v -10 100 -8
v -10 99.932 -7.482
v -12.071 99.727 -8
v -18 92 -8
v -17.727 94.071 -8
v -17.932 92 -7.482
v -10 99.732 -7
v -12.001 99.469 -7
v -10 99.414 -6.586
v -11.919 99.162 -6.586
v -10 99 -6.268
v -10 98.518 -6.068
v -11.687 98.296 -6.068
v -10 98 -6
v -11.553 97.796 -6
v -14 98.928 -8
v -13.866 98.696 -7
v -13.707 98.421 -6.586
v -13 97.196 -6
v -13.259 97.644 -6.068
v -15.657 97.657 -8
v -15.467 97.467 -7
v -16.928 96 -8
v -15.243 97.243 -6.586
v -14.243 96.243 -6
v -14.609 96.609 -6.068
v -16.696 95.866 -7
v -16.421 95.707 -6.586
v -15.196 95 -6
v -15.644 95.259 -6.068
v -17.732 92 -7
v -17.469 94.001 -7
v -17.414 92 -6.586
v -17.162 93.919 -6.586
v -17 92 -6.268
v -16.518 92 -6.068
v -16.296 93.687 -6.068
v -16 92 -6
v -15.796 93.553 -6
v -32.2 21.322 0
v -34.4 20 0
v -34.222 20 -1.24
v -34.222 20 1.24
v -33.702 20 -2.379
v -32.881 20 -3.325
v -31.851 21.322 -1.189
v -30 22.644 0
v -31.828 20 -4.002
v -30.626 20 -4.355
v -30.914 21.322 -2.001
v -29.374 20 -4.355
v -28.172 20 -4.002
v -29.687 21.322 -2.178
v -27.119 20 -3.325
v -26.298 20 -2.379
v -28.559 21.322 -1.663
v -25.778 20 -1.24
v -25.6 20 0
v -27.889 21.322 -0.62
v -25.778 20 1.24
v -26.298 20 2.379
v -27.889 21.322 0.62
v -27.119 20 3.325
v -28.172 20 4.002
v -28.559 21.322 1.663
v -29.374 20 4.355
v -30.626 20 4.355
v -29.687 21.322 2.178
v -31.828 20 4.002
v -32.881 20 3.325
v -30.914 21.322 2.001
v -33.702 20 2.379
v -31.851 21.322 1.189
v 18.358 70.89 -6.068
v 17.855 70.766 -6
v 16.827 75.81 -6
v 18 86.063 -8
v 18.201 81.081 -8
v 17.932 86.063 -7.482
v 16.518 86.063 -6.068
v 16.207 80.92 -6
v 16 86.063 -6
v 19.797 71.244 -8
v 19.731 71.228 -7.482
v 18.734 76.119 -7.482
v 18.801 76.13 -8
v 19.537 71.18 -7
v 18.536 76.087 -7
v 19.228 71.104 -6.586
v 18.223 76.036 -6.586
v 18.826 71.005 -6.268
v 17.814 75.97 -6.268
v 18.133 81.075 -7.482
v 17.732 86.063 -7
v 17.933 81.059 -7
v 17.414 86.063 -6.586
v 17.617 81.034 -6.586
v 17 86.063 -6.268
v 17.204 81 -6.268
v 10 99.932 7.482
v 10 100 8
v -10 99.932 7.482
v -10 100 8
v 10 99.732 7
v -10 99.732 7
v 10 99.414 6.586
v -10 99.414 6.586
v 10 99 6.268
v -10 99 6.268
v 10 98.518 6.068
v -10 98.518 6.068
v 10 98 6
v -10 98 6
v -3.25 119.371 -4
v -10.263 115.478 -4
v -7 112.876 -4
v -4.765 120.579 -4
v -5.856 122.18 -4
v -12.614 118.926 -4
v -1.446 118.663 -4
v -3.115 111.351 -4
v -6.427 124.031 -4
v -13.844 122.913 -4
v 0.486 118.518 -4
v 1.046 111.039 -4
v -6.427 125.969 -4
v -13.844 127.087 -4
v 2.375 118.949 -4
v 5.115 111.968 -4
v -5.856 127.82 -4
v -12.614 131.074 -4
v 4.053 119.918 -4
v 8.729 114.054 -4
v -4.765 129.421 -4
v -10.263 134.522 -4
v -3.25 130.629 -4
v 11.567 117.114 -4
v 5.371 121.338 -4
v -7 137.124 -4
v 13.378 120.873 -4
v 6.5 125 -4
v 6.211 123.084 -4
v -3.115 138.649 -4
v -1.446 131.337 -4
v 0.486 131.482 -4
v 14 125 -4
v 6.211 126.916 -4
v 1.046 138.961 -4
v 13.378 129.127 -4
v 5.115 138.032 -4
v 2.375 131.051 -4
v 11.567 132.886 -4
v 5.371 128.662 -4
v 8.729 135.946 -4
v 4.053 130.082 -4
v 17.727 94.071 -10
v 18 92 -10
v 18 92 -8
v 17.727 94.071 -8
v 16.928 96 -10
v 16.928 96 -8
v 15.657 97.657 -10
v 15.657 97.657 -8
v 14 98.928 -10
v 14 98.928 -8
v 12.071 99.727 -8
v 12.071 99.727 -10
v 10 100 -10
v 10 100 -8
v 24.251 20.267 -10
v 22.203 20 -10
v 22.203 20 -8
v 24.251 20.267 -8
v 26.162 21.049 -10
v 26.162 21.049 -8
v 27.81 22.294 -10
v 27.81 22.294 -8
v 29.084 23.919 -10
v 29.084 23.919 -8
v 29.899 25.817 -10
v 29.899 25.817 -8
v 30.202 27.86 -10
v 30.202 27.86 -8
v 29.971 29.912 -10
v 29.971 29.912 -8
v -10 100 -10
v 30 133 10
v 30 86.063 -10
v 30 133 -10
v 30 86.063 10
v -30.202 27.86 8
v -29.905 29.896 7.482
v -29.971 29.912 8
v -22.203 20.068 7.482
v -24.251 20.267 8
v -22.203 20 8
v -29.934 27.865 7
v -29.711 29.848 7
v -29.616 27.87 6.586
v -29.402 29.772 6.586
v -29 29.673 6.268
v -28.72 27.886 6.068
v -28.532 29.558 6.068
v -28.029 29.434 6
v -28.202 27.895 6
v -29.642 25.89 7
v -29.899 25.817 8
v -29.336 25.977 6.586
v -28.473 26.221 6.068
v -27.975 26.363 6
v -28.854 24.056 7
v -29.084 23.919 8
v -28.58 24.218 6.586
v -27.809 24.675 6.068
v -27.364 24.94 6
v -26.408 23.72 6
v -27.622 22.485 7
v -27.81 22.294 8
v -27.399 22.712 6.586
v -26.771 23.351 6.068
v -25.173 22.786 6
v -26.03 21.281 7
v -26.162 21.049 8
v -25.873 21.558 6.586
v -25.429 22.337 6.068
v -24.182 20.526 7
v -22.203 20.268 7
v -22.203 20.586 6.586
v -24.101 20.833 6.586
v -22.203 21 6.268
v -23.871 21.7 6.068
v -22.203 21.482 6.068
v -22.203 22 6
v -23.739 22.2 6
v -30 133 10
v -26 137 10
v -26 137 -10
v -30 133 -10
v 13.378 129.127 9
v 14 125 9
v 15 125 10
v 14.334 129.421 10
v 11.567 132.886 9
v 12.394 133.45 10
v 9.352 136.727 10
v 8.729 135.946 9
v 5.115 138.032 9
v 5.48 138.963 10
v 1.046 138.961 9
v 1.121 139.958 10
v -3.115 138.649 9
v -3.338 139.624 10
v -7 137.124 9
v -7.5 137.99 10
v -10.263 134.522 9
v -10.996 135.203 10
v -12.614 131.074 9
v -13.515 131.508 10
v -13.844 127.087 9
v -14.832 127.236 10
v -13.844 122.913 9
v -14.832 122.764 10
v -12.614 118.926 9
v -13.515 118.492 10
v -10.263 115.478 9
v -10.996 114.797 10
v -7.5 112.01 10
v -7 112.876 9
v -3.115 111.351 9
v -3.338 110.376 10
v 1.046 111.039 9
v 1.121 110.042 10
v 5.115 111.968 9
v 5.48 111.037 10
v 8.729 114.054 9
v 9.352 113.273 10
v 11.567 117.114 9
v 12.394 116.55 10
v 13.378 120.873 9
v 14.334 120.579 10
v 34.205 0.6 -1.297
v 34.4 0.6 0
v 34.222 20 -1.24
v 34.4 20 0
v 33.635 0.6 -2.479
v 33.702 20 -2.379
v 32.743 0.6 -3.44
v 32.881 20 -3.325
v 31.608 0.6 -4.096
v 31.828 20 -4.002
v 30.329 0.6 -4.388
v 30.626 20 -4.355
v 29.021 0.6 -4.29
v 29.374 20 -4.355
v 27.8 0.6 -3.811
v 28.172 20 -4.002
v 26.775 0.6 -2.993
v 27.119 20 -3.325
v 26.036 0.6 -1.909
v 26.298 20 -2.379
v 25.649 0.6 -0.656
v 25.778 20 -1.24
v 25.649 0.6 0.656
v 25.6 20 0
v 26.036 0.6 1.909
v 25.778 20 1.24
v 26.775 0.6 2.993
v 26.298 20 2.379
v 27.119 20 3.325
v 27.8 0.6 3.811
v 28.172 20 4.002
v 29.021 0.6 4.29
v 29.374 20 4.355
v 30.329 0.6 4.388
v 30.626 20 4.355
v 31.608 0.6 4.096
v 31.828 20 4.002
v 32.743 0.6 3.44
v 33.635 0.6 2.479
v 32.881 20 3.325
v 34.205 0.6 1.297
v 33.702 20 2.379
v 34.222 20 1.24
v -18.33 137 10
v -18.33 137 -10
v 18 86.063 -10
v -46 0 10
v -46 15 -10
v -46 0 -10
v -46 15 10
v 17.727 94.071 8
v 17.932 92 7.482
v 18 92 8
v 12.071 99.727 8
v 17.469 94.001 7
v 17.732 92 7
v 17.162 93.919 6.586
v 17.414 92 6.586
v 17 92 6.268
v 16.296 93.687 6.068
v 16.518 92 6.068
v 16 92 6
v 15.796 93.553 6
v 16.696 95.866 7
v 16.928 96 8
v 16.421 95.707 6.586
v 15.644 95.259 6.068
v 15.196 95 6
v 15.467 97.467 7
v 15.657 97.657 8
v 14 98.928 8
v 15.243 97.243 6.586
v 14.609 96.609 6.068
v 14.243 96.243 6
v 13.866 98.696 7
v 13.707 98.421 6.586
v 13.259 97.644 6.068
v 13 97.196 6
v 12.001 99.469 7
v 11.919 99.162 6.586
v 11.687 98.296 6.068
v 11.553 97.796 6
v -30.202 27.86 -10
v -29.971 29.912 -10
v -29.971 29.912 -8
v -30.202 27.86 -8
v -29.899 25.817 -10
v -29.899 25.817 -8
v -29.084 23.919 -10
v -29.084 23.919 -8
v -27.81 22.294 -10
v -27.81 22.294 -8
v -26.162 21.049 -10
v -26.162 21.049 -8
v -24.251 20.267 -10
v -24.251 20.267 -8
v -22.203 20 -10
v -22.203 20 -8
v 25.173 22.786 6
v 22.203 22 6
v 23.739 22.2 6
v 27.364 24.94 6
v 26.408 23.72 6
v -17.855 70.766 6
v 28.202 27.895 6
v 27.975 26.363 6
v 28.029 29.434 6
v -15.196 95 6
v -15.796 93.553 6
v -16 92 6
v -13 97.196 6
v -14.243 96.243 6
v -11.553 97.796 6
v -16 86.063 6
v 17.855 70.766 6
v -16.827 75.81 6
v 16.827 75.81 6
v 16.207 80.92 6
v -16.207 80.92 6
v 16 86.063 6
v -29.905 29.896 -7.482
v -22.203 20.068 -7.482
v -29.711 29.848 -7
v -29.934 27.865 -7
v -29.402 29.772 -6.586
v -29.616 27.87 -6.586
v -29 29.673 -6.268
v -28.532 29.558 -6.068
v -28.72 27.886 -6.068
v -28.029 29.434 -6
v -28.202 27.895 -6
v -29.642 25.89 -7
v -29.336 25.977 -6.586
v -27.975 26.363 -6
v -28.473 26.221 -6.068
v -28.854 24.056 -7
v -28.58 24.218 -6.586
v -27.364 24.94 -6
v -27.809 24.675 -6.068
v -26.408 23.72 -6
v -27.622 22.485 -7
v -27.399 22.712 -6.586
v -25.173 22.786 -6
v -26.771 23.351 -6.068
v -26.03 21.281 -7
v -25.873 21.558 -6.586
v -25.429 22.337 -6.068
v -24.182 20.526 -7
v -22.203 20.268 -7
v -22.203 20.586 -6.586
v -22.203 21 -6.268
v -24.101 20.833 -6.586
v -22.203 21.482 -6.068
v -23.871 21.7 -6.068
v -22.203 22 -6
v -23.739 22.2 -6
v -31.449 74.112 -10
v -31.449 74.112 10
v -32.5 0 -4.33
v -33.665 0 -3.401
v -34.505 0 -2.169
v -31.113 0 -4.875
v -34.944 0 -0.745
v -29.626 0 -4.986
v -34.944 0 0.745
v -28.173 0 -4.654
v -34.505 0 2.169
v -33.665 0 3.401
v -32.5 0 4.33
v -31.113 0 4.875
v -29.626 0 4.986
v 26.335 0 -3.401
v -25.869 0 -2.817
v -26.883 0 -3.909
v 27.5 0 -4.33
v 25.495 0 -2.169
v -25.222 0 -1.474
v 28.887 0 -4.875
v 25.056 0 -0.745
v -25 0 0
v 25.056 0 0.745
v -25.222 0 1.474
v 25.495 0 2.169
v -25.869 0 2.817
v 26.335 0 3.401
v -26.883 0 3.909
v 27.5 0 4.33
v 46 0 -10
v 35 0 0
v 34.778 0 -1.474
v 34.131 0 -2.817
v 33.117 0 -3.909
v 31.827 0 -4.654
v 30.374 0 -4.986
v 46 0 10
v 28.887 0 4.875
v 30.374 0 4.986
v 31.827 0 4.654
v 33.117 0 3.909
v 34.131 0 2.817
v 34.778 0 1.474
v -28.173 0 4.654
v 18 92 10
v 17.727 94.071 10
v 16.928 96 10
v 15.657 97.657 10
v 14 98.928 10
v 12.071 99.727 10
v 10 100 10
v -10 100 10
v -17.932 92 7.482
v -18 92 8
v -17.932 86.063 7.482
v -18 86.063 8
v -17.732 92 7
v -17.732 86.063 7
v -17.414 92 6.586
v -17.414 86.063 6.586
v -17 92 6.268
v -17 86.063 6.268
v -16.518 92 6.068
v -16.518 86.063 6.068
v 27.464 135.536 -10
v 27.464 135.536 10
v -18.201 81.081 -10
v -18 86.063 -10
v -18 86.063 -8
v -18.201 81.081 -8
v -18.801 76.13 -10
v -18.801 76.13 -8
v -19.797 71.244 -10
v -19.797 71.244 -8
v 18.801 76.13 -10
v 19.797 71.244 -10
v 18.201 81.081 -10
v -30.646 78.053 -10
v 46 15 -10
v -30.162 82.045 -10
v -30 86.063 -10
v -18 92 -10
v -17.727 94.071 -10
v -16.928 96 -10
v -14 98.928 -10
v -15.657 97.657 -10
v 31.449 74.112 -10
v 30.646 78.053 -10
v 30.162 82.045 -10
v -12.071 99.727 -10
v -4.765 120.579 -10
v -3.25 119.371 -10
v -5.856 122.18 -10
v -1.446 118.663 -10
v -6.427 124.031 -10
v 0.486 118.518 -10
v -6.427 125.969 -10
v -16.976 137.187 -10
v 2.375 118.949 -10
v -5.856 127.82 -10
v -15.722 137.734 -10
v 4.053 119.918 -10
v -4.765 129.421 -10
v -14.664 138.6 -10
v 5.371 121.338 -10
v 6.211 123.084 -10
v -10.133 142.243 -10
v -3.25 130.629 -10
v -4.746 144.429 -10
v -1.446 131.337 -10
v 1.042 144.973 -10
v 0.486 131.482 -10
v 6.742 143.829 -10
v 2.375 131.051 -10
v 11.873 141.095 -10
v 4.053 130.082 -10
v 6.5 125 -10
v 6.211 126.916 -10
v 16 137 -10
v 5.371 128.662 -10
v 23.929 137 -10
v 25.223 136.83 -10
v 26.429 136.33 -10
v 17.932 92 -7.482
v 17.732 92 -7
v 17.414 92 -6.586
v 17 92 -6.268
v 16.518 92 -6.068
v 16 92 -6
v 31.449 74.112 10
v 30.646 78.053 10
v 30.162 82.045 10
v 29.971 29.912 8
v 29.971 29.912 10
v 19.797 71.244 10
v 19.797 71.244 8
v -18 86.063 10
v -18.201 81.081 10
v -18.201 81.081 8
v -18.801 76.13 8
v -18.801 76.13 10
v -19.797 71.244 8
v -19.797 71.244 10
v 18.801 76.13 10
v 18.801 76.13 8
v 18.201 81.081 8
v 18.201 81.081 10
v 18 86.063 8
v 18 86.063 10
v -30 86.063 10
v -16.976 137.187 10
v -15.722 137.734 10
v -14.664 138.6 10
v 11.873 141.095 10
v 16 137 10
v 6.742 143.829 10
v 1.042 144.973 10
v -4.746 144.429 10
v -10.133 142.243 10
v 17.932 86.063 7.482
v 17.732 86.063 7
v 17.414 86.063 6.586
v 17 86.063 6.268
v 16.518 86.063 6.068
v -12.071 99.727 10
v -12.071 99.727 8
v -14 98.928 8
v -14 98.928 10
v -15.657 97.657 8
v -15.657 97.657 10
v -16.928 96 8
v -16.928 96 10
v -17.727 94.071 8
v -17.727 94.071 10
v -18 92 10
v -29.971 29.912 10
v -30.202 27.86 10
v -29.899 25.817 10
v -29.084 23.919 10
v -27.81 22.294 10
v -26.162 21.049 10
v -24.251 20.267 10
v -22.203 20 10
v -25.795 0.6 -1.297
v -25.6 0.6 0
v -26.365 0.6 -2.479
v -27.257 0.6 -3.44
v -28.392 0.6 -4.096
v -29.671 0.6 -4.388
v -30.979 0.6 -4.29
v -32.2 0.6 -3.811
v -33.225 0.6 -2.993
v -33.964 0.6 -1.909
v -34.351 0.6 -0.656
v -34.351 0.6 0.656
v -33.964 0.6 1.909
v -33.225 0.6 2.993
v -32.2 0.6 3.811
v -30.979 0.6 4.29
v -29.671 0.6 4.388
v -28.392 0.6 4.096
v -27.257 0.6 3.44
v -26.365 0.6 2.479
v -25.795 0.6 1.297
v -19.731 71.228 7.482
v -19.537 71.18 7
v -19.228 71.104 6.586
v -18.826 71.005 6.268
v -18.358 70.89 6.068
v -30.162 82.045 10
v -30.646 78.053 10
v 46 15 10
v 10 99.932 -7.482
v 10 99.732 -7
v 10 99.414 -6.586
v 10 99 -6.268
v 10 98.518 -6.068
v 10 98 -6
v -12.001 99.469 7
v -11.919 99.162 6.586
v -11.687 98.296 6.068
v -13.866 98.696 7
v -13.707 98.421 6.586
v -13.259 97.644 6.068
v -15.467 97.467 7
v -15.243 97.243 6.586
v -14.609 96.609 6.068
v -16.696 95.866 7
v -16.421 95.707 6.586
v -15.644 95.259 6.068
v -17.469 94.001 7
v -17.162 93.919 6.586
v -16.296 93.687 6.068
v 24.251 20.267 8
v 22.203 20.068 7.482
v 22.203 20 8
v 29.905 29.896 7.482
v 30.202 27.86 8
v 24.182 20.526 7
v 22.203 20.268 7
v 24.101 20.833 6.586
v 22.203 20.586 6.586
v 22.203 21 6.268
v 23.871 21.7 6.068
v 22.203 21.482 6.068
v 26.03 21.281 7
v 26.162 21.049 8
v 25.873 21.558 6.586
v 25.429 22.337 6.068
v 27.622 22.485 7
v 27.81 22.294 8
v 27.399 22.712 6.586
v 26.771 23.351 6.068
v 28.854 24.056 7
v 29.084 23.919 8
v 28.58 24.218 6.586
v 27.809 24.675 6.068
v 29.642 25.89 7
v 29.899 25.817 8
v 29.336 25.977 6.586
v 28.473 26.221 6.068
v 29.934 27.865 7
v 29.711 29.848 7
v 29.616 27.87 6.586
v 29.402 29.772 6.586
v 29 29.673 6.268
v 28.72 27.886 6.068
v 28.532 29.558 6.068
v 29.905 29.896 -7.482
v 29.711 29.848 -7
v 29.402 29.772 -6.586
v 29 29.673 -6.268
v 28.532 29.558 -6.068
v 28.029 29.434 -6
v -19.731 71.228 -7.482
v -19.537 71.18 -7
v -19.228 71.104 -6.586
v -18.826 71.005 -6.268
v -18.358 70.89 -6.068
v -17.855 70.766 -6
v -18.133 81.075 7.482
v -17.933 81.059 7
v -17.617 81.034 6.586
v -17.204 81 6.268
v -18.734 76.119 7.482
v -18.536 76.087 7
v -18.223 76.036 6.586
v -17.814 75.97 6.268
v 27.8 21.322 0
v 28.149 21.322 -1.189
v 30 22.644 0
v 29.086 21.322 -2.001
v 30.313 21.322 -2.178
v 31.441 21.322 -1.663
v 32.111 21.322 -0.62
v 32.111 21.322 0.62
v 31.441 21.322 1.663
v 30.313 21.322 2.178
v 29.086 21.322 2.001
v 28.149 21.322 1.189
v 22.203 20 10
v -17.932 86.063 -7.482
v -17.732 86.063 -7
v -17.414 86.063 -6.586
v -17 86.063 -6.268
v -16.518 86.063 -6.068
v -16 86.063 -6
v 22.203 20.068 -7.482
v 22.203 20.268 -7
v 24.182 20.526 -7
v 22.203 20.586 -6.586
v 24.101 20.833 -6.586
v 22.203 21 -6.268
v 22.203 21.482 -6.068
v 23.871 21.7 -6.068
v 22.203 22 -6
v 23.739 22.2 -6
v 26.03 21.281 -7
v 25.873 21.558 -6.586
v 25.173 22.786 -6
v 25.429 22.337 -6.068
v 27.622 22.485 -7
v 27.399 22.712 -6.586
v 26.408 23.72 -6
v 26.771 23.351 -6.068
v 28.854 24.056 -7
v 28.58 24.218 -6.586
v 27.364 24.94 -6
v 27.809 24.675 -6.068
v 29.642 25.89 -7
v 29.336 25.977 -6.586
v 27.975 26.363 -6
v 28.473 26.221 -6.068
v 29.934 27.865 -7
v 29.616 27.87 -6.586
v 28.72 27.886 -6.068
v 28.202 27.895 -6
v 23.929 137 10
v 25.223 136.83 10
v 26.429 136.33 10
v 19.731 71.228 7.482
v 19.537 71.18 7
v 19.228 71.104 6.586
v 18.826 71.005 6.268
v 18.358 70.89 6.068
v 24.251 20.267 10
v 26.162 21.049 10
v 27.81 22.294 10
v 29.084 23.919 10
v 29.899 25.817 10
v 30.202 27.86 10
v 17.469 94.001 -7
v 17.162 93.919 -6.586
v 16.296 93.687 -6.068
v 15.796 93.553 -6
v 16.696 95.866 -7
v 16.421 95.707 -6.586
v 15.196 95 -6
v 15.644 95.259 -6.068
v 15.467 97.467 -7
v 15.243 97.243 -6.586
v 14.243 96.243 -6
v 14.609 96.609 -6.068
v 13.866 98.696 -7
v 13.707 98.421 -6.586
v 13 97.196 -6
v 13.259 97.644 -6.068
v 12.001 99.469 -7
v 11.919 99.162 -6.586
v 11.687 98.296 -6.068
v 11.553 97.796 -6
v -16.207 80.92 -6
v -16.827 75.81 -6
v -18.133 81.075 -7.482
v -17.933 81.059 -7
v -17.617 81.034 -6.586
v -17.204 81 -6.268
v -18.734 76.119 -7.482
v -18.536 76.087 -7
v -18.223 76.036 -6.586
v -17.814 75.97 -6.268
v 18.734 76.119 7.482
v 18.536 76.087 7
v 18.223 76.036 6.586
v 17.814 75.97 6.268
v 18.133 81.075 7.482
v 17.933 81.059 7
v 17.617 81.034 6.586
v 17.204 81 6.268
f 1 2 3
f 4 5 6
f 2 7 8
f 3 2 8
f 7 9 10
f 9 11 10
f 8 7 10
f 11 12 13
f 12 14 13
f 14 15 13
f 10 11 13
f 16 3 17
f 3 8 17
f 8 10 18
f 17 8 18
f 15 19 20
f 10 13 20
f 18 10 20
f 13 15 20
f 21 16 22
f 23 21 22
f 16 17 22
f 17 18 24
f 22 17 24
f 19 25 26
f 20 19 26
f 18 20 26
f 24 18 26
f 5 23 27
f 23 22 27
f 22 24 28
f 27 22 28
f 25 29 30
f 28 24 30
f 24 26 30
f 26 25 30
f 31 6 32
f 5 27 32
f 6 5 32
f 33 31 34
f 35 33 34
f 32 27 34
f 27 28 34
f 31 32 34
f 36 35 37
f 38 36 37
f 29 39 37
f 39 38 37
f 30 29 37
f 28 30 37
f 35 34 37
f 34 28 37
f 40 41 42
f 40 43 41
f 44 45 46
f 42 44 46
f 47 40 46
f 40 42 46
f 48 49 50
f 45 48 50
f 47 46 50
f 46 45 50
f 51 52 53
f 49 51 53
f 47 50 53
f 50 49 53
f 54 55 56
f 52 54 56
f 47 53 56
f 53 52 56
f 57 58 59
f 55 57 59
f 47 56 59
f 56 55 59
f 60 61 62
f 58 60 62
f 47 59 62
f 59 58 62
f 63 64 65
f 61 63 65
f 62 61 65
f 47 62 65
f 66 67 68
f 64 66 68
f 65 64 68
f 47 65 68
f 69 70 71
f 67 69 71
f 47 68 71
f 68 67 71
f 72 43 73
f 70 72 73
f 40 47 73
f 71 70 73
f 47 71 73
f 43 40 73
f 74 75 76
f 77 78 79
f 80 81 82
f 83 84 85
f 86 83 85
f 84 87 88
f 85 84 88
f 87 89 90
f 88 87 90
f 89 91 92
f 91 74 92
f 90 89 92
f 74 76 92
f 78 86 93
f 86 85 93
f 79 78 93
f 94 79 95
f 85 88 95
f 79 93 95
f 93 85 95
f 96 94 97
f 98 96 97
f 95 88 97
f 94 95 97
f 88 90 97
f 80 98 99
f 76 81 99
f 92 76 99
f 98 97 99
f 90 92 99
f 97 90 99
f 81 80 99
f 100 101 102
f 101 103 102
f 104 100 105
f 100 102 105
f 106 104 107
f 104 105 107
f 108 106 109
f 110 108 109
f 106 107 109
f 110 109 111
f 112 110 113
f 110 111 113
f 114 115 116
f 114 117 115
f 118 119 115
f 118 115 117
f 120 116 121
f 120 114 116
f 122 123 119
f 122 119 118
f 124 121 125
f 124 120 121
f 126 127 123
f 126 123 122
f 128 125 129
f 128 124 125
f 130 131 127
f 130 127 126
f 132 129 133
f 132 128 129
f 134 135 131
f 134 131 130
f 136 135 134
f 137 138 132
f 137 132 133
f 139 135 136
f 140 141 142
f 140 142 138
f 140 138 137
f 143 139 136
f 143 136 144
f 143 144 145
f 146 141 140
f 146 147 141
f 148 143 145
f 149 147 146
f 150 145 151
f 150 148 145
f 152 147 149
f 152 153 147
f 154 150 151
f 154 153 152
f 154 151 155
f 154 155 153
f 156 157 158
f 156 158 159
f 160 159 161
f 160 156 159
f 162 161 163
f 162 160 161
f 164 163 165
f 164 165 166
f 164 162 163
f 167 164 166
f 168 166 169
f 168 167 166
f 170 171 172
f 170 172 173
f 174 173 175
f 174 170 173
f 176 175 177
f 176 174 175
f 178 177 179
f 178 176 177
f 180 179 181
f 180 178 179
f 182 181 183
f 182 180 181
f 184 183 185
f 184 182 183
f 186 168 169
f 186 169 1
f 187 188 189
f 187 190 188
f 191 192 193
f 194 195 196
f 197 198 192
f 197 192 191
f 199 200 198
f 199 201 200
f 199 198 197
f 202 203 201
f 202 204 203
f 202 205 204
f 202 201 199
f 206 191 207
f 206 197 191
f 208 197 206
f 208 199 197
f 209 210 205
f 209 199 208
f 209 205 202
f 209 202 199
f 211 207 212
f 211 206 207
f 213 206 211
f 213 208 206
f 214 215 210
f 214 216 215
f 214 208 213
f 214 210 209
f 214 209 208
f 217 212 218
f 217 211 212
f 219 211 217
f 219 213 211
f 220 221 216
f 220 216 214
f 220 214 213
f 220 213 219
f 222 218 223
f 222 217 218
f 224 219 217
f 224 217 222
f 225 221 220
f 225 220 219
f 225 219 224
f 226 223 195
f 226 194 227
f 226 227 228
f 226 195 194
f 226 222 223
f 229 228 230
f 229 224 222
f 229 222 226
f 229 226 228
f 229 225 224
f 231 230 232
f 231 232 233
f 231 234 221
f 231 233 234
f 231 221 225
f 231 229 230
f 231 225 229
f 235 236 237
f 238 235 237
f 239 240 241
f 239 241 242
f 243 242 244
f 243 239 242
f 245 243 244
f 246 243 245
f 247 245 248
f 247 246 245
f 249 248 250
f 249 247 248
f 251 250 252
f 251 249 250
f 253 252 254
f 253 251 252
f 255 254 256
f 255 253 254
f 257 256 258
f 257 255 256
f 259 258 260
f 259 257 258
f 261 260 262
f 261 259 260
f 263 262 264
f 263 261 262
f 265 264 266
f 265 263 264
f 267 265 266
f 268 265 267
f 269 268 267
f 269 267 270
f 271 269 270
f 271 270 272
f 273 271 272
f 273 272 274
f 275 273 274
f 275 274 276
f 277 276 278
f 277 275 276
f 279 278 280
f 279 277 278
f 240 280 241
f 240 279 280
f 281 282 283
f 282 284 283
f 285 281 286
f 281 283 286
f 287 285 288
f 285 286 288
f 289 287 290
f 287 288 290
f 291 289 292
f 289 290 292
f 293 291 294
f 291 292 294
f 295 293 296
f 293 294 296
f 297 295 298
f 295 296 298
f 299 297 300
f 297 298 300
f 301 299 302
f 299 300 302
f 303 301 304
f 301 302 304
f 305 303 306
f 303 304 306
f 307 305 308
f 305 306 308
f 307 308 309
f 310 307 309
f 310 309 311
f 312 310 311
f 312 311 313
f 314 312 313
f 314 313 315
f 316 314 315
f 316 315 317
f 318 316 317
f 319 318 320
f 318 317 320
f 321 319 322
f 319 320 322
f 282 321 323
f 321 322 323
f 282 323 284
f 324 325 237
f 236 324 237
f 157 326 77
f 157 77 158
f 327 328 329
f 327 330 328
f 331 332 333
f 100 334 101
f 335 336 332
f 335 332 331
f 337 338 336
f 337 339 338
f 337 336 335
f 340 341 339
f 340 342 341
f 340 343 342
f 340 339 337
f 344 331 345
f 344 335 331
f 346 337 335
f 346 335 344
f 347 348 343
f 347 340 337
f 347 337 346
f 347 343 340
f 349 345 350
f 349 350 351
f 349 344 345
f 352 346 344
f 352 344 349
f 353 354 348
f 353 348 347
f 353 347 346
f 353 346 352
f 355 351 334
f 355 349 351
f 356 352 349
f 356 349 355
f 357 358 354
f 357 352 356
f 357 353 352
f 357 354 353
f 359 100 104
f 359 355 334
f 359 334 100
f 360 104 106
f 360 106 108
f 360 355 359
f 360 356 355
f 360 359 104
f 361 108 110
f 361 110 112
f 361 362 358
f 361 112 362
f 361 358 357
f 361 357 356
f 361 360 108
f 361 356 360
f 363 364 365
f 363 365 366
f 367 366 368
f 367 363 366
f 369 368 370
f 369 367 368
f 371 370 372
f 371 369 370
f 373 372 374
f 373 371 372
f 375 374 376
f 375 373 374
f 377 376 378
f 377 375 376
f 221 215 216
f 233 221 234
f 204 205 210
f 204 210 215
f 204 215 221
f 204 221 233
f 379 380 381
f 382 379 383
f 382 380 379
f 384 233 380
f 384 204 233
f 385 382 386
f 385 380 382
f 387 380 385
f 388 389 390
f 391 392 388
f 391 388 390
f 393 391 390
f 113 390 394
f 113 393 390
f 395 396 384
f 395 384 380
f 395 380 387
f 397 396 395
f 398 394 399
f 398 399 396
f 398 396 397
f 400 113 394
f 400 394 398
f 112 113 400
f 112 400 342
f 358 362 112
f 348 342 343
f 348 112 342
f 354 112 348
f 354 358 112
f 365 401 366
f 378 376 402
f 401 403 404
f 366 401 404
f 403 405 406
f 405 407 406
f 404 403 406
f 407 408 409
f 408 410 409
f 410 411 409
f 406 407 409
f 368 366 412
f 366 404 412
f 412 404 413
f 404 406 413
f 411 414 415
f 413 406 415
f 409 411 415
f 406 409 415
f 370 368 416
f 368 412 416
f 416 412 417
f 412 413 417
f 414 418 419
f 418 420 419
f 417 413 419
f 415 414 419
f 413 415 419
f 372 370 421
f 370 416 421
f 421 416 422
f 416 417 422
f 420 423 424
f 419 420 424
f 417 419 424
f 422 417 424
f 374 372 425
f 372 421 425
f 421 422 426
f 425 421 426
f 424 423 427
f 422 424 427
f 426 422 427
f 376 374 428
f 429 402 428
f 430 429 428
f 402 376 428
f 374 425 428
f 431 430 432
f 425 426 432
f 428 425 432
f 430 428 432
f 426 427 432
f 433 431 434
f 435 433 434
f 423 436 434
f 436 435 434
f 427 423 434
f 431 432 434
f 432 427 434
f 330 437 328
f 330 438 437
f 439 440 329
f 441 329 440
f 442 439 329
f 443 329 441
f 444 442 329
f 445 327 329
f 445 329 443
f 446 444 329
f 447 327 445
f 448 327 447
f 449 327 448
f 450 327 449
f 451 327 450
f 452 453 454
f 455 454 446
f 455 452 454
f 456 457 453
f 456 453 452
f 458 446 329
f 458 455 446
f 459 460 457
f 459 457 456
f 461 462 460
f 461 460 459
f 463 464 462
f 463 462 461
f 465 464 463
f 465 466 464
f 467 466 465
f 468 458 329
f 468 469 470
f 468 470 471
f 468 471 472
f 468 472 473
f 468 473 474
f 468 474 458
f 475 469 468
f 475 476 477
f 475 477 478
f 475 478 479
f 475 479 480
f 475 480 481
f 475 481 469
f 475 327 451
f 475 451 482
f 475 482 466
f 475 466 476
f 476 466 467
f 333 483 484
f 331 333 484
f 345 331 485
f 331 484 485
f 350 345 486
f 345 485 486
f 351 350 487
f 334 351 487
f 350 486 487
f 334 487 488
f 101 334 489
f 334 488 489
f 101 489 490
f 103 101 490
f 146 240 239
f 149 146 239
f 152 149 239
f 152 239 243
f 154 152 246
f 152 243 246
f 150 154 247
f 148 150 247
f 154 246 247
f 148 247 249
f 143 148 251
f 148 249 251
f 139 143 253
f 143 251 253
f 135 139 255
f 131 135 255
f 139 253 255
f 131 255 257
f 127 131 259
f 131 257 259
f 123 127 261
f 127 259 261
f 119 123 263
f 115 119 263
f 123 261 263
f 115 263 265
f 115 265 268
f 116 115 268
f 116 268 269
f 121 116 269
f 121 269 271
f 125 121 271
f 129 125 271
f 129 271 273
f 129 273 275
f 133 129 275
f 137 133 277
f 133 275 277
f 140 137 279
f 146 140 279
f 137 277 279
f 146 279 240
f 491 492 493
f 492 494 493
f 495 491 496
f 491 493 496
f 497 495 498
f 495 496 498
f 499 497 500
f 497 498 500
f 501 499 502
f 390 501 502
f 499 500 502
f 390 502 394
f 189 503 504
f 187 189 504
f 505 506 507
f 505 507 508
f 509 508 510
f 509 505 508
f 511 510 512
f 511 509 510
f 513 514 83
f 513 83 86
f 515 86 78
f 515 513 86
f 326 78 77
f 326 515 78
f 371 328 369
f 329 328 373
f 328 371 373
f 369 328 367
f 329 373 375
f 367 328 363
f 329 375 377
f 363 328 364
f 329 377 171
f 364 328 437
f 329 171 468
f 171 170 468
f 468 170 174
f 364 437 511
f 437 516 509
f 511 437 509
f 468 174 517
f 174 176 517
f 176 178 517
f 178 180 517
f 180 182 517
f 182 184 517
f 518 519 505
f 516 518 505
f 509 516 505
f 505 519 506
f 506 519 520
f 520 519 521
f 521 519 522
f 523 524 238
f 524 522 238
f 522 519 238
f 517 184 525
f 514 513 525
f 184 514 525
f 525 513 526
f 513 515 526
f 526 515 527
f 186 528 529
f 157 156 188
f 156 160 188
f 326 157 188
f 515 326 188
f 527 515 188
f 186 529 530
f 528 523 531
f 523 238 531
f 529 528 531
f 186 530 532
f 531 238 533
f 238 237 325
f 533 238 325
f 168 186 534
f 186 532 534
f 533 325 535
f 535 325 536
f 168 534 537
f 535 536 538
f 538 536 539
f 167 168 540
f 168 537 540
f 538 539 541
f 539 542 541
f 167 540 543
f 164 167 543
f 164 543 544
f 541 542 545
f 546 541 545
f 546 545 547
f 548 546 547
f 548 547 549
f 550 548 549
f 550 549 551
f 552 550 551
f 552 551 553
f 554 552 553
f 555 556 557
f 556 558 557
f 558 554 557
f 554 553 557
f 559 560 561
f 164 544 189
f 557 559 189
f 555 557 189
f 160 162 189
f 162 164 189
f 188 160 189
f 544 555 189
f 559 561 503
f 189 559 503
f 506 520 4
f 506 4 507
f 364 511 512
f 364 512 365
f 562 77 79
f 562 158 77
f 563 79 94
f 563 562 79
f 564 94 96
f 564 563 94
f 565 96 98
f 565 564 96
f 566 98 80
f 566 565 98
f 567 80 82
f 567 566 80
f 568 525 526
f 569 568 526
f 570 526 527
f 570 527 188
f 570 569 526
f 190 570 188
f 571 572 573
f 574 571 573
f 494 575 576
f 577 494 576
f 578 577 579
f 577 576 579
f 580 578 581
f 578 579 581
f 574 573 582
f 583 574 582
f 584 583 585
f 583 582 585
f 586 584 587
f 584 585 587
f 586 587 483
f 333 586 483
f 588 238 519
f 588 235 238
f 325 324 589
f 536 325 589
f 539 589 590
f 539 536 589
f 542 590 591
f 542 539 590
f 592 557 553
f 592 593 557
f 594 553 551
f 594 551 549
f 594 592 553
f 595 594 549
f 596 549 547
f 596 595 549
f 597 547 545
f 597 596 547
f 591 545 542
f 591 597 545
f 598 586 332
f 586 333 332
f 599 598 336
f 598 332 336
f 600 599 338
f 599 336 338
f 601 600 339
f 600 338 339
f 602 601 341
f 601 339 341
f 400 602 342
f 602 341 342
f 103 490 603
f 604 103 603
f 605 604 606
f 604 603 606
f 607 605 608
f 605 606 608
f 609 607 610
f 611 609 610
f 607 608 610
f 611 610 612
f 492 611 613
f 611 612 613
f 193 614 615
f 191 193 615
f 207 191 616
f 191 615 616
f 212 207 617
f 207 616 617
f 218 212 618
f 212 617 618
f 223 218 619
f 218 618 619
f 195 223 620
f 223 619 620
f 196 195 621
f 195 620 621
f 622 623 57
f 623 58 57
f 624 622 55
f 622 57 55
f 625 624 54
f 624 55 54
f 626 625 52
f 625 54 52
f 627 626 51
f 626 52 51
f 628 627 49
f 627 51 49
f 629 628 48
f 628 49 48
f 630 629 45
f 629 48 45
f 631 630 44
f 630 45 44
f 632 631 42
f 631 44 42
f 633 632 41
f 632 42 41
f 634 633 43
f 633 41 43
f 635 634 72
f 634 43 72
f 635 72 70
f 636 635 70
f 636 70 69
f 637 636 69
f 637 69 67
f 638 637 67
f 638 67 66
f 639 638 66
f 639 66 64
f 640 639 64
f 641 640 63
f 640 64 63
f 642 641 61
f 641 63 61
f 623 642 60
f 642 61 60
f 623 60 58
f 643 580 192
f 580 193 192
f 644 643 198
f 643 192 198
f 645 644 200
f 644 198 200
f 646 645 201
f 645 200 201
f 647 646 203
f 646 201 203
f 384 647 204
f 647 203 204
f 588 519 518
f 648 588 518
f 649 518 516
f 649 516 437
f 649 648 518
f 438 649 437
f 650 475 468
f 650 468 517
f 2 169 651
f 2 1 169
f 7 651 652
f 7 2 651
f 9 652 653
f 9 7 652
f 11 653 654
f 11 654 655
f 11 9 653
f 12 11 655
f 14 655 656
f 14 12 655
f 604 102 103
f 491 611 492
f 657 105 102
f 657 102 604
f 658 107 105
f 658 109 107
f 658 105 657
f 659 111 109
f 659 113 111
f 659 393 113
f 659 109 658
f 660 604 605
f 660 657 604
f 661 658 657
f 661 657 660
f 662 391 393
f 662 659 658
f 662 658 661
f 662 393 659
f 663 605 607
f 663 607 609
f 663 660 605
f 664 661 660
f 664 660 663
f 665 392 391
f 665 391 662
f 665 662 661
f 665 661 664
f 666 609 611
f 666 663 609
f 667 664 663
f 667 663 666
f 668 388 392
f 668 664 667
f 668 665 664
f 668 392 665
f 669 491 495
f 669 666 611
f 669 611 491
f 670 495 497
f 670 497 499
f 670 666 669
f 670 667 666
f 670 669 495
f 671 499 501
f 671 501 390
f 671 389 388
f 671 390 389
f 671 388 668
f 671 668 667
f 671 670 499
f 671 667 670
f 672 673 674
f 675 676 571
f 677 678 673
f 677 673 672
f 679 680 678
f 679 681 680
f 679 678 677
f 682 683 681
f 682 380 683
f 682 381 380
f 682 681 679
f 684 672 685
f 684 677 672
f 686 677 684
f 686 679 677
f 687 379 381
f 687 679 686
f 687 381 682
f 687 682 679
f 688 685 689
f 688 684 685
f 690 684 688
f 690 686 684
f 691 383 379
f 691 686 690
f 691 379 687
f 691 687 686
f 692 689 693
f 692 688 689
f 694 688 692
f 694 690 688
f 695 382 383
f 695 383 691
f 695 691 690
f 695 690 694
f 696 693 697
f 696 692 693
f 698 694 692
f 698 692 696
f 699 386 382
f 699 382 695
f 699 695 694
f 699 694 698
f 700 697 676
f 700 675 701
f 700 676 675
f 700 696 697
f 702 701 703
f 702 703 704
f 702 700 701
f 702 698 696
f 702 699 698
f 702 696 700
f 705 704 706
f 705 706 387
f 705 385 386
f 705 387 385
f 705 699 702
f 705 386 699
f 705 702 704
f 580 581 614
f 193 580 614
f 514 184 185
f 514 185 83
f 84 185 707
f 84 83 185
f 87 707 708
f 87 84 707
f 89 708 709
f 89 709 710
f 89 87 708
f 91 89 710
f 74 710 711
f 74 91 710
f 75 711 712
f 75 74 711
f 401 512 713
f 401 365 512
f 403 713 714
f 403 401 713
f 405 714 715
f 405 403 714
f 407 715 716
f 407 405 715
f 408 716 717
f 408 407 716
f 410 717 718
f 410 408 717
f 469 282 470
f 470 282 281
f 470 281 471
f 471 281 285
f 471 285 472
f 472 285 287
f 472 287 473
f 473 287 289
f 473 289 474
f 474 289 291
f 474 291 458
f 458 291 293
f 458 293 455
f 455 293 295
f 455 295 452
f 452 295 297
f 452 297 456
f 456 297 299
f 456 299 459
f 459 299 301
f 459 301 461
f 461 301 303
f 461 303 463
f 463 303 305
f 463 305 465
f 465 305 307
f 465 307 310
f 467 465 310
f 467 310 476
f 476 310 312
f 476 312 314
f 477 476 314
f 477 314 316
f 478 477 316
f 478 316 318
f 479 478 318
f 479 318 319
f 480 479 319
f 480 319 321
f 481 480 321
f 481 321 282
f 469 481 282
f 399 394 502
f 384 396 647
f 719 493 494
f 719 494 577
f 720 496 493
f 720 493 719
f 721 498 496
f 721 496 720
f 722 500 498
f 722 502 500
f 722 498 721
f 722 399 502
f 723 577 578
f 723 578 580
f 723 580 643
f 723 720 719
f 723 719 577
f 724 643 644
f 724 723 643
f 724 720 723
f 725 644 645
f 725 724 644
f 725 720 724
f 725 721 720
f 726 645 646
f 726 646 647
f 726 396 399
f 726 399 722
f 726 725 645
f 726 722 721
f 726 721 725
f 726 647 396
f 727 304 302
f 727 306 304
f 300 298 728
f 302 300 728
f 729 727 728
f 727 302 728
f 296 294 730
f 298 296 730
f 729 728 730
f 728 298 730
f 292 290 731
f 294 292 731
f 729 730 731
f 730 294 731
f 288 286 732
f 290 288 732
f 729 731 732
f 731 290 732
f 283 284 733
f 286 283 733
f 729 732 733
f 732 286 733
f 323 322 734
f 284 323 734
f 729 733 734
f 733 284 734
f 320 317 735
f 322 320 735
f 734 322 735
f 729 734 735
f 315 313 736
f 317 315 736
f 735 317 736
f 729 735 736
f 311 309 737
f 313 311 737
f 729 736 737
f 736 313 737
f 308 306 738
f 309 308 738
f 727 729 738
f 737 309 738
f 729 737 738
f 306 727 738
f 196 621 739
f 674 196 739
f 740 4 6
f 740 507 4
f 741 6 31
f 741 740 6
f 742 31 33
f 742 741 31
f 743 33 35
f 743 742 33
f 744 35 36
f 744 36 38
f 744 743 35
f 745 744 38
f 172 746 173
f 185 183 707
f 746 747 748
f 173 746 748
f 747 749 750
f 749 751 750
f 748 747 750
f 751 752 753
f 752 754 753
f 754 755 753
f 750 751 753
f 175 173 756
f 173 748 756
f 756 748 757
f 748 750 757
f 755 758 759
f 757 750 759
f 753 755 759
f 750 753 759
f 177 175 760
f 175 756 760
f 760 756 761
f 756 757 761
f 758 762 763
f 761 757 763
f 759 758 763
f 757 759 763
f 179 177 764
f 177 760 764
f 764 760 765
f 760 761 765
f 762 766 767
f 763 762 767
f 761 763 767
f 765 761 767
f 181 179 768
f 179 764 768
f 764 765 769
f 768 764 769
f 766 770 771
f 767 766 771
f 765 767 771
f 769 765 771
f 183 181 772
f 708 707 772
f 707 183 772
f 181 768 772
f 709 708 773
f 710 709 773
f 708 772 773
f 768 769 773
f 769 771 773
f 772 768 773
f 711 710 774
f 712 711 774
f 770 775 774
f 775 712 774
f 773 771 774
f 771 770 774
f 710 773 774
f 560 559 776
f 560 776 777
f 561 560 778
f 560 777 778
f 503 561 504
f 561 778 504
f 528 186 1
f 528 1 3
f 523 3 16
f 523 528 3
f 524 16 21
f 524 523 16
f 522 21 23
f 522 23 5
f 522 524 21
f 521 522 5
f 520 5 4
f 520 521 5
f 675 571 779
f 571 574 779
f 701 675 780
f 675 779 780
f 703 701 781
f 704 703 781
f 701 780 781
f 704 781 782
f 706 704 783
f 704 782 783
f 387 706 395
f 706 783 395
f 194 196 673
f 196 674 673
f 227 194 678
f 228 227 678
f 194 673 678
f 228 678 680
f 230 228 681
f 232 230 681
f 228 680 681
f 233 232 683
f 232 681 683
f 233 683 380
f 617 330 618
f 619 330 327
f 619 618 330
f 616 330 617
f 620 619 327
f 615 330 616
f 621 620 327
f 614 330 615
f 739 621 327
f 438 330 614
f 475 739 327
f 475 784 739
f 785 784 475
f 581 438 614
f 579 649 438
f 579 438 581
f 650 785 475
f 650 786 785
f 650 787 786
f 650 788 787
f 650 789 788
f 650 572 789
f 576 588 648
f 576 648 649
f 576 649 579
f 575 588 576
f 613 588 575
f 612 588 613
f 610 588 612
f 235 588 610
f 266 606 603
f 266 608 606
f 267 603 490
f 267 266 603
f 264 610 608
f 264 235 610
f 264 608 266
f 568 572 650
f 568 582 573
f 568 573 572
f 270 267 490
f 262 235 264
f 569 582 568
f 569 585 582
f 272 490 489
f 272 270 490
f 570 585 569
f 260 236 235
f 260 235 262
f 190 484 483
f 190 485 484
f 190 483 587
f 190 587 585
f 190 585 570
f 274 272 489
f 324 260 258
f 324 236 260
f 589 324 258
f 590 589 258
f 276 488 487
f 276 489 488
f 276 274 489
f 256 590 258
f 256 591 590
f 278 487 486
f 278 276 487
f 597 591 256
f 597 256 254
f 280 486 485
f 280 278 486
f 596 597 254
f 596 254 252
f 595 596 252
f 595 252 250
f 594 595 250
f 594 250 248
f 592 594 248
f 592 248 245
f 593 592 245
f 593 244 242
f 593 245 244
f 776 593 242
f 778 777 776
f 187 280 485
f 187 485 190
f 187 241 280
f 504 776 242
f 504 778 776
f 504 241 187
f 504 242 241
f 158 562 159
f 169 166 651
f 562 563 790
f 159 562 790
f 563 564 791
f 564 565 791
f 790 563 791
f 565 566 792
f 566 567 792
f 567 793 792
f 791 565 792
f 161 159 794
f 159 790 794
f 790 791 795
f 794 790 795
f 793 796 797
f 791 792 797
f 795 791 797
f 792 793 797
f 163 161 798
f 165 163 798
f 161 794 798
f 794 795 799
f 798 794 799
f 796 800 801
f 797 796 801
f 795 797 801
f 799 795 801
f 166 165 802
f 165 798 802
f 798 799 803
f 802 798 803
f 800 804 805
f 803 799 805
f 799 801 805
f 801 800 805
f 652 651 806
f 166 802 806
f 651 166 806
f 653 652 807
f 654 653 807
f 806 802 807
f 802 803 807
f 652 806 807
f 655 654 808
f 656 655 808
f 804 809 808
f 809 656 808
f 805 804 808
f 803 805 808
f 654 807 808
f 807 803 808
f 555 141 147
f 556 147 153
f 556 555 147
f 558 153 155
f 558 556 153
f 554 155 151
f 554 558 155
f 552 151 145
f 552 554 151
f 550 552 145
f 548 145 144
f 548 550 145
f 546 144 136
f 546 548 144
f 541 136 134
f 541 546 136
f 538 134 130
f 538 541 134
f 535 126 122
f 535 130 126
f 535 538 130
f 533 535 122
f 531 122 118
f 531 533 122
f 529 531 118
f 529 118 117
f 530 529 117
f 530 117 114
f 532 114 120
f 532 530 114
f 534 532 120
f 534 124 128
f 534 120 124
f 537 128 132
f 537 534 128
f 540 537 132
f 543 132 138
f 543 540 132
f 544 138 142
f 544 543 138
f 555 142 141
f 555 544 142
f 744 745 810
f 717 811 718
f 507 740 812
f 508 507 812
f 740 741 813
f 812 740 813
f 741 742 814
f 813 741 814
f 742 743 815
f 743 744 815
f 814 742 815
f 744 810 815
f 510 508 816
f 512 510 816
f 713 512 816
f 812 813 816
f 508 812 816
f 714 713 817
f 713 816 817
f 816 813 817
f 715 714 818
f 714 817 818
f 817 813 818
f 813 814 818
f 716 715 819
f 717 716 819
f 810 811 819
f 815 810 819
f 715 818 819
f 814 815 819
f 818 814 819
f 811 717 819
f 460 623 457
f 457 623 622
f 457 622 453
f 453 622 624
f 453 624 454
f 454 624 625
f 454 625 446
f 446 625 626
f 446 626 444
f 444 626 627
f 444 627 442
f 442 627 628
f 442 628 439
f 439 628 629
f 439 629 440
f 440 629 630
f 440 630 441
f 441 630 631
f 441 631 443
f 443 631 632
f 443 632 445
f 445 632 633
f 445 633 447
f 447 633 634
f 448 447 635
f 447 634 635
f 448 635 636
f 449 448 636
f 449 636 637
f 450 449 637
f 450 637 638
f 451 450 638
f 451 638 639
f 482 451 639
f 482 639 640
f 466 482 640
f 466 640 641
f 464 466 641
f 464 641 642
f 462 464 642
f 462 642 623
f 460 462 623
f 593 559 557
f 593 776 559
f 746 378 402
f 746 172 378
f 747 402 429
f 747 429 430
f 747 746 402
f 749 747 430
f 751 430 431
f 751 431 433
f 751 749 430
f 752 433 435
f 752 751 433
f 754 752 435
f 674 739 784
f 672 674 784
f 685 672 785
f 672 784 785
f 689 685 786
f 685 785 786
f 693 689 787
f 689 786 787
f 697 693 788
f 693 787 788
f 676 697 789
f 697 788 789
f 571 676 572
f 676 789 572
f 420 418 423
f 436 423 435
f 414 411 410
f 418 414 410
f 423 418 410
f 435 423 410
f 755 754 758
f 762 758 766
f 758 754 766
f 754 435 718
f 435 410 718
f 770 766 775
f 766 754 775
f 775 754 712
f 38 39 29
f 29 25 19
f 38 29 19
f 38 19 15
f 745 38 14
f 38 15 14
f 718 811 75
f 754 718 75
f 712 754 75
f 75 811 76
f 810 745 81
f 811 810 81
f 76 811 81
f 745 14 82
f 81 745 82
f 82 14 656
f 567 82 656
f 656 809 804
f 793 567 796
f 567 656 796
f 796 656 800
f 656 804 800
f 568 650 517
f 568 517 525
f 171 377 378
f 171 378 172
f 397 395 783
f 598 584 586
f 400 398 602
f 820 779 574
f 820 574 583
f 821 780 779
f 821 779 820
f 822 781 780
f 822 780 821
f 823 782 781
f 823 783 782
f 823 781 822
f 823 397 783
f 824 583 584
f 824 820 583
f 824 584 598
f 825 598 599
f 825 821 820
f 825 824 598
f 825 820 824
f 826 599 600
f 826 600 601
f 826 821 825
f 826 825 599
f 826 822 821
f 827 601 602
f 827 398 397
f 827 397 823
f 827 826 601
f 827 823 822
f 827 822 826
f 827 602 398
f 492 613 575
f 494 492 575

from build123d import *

# Parameters (mm, degrees)
SKETCH1_R                         = 6.5
BOSS_EXTRUDE1_DEPTH               = 10
SKETCH2_R                         = 14
CUT_EXTRUDE1_DEPTH                = 14
CHAMFER1_SIZE                     = 1
CHAMFER2_SIZE                     = 4
FILLET1_R                         = 5
CUT_EXTRUDE2_DEPTH                = 4
FILLET2_R                         = 2
FILLET2_OF_MIRROR1_R              = 2
M10X1_25_TAPPED_HOLE1_D           = 8.8
M10X1_25_TAPPED_HOLE1_DEPTH       = 20
M10X1_25_TAPPED_HOLE1_CSINK_D     = 10
M10X1_25_TAPPED_HOLE1_CSINK_ANGLE = 90
M10X1_25_TAPPED_HOLE1_TIP         = 2.643786724


with BuildPart() as part:
    # Sketch1 → Boss-Extrude1 (new, symmetric)
    with BuildSketch(Plane.XY):
        with BuildLine():
            Line((-46, 0), (46, 0))
            Line((46, 0), (46, 15))
            Line((46, 15), (31.449256053, 74.112397284))
            ThreePointArc((31.449256053, 74.112397284), (30.363636327, 80.044097084), (30, 86.06334964))
            Line((30, 86.06334964), (30, 137))
            Line((30, 137), (16, 137))
            ThreePointArc((16, 137), (0, 145), (-16, 137))
            Line((-16, 137), (-30, 137))
            Line((-30, 137), (-30, 86.06334964))
            ThreePointArc((-30, 86.06334964), (-30.363636327, 80.044097084), (-31.449256053, 74.112397284))
            Line((-31.449256053, 74.112397284), (-46, 15))
            Line((-46, 15), (-46, 0))
        make_face()
        with Locations((0, 125)):
            Circle(SKETCH1_R, mode=Mode.SUBTRACT)
    extrude(amount=BOSS_EXTRUDE1_DEPTH, both=True)

    # Sketch2 → Cut-Extrude1 (cut)
    with BuildSketch(Plane.XY.offset(10)):
        with Locations((0, 125)):
            Circle(SKETCH2_R)
    extrude(amount=-CUT_EXTRUDE1_DEPTH, mode=Mode.SUBTRACT)

    # Chamfer1
    chamfer1_edges = [part.edges().sort_by_distance(p)[0] for p in [
        (-14, 125, 10),
    ]]
    chamfer(chamfer1_edges, length=CHAMFER1_SIZE)

    # Chamfer2
    chamfer2_edges = [part.edges().sort_by_distance(p)[0] for p in [
        (-30, 137, 0),
        (30, 137, 0),
    ]]
    chamfer(chamfer2_edges, length=CHAMFER2_SIZE)

    # Fillet1
    fillet1_edges = [part.edges().sort_by_distance(p)[0] for p in [
        (-16, 137, 0),
        (26, 137, 0),
    ]]
    fillet(fillet1_edges, radius=FILLET1_R)

    # Sketch3 → Cut-Extrude2 (cut)
    with BuildSketch(Plane.XY.offset(10)):
        with BuildLine():
            Line((-18, 92), (-18, 86.06334964))
            ThreePointArc((-18, 86.06334964), (-18.450909046, 78.59947647), (-19.797077506, 71.244168718))
            Line((-19.797077506, 71.244168718), (-29.971112298, 29.912152377))
            ThreePointArc((-29.971112298, 29.912152377), (-28.49970745, 23.065287193), (-22.202993266, 20))
            Line((-22.202993266, 20), (22.202993266, 20))
            ThreePointArc((22.202993266, 20), (28.49970745, 23.065287193), (29.971112298, 29.912152377))
            Line((29.971112298, 29.912152377), (19.797077506, 71.244168718))
            ThreePointArc((19.797077506, 71.244168718), (18.450909046, 78.59947647), (18, 86.06334964))
            Line((18, 86.06334964), (18, 92))
            ThreePointArc((18, 92), (15.656854249, 97.656854249), (10, 100))
            Line((10, 100), (-10, 100))
            ThreePointArc((-10, 100), (-15.656854249, 97.656854249), (-18, 92))
        make_face()
    cut_extrude2 = extrude(amount=-CUT_EXTRUDE2_DEPTH, mode=Mode.SUBTRACT)

    # Fillet2
    fillet2_edges = [part.edges().sort_by_distance(p)[0] for p in [
        (15.656854249, 97.656854249, 6),
        (18, 89.03167482, 6),
        (18.450909046, 78.59947647, 6),
        (24.884094902, 50.578160548, 6),
        (28.49970745, 23.065287193, 6),
        (0, 20, 6),
        (-28.49970745, 23.065287193, 6),
        (-24.884094902, 50.578160548, 6),
        (-18.450909046, 78.59947647, 6),
        (-18, 89.03167482, 6),
        (-15.656854249, 97.656854249, 6),
        (0, 100, 6),
    ]]
    fillet(fillet2_edges, radius=FILLET2_R)

    # Mirror1: Cut-Extrude2 across plane
    add(cut_extrude2.mirror(Plane.XY), mode=Mode.SUBTRACT)

    # Fillet2 of Mirror1
    fillet2_of_mirror1_edges = [part.edges().sort_by_distance(p)[0] for p in [
        (15.656854249, 97.656854249, -6),
        (18, 89.03167482, -6),
        (18.450909046, 78.59947647, -6),
        (24.884094902, 50.578160548, -6),
        (28.49970745, 23.065287193, -6),
        (0, 20, -6),
        (-28.49970745, 23.065287193, -6),
        (-24.884094902, 50.578160548, -6),
        (-18.450909046, 78.59947647, -6),
        (-18, 89.03167482, -6),
        (-15.656854249, 97.656854249, -6),
        (0, 100, -6),
    ]]
    fillet(fillet2_of_mirror1_edges, radius=FILLET2_OF_MIRROR1_R)

    # M10x1.25 Tapped Hole1
    with Locations(Plane(origin=(0, 0, 0), x_dir=(-1, 0, 0), z_dir=(0, -1, 0))):
        with Locations((-30, 0), (30, 0)):
            CounterSinkHole(M10X1_25_TAPPED_HOLE1_D / 2, M10X1_25_TAPPED_HOLE1_CSINK_D / 2, depth=M10X1_25_TAPPED_HOLE1_DEPTH, counter_sink_angle=M10X1_25_TAPPED_HOLE1_CSINK_ANGLE)
            with Locations((0, 0, -(M10X1_25_TAPPED_HOLE1_DEPTH + M10X1_25_TAPPED_HOLE1_TIP / 2))):  # 118° drill point
                Cone(0, M10X1_25_TAPPED_HOLE1_D / 2, M10X1_25_TAPPED_HOLE1_TIP, mode=Mode.SUBTRACT)


solid = part.part
